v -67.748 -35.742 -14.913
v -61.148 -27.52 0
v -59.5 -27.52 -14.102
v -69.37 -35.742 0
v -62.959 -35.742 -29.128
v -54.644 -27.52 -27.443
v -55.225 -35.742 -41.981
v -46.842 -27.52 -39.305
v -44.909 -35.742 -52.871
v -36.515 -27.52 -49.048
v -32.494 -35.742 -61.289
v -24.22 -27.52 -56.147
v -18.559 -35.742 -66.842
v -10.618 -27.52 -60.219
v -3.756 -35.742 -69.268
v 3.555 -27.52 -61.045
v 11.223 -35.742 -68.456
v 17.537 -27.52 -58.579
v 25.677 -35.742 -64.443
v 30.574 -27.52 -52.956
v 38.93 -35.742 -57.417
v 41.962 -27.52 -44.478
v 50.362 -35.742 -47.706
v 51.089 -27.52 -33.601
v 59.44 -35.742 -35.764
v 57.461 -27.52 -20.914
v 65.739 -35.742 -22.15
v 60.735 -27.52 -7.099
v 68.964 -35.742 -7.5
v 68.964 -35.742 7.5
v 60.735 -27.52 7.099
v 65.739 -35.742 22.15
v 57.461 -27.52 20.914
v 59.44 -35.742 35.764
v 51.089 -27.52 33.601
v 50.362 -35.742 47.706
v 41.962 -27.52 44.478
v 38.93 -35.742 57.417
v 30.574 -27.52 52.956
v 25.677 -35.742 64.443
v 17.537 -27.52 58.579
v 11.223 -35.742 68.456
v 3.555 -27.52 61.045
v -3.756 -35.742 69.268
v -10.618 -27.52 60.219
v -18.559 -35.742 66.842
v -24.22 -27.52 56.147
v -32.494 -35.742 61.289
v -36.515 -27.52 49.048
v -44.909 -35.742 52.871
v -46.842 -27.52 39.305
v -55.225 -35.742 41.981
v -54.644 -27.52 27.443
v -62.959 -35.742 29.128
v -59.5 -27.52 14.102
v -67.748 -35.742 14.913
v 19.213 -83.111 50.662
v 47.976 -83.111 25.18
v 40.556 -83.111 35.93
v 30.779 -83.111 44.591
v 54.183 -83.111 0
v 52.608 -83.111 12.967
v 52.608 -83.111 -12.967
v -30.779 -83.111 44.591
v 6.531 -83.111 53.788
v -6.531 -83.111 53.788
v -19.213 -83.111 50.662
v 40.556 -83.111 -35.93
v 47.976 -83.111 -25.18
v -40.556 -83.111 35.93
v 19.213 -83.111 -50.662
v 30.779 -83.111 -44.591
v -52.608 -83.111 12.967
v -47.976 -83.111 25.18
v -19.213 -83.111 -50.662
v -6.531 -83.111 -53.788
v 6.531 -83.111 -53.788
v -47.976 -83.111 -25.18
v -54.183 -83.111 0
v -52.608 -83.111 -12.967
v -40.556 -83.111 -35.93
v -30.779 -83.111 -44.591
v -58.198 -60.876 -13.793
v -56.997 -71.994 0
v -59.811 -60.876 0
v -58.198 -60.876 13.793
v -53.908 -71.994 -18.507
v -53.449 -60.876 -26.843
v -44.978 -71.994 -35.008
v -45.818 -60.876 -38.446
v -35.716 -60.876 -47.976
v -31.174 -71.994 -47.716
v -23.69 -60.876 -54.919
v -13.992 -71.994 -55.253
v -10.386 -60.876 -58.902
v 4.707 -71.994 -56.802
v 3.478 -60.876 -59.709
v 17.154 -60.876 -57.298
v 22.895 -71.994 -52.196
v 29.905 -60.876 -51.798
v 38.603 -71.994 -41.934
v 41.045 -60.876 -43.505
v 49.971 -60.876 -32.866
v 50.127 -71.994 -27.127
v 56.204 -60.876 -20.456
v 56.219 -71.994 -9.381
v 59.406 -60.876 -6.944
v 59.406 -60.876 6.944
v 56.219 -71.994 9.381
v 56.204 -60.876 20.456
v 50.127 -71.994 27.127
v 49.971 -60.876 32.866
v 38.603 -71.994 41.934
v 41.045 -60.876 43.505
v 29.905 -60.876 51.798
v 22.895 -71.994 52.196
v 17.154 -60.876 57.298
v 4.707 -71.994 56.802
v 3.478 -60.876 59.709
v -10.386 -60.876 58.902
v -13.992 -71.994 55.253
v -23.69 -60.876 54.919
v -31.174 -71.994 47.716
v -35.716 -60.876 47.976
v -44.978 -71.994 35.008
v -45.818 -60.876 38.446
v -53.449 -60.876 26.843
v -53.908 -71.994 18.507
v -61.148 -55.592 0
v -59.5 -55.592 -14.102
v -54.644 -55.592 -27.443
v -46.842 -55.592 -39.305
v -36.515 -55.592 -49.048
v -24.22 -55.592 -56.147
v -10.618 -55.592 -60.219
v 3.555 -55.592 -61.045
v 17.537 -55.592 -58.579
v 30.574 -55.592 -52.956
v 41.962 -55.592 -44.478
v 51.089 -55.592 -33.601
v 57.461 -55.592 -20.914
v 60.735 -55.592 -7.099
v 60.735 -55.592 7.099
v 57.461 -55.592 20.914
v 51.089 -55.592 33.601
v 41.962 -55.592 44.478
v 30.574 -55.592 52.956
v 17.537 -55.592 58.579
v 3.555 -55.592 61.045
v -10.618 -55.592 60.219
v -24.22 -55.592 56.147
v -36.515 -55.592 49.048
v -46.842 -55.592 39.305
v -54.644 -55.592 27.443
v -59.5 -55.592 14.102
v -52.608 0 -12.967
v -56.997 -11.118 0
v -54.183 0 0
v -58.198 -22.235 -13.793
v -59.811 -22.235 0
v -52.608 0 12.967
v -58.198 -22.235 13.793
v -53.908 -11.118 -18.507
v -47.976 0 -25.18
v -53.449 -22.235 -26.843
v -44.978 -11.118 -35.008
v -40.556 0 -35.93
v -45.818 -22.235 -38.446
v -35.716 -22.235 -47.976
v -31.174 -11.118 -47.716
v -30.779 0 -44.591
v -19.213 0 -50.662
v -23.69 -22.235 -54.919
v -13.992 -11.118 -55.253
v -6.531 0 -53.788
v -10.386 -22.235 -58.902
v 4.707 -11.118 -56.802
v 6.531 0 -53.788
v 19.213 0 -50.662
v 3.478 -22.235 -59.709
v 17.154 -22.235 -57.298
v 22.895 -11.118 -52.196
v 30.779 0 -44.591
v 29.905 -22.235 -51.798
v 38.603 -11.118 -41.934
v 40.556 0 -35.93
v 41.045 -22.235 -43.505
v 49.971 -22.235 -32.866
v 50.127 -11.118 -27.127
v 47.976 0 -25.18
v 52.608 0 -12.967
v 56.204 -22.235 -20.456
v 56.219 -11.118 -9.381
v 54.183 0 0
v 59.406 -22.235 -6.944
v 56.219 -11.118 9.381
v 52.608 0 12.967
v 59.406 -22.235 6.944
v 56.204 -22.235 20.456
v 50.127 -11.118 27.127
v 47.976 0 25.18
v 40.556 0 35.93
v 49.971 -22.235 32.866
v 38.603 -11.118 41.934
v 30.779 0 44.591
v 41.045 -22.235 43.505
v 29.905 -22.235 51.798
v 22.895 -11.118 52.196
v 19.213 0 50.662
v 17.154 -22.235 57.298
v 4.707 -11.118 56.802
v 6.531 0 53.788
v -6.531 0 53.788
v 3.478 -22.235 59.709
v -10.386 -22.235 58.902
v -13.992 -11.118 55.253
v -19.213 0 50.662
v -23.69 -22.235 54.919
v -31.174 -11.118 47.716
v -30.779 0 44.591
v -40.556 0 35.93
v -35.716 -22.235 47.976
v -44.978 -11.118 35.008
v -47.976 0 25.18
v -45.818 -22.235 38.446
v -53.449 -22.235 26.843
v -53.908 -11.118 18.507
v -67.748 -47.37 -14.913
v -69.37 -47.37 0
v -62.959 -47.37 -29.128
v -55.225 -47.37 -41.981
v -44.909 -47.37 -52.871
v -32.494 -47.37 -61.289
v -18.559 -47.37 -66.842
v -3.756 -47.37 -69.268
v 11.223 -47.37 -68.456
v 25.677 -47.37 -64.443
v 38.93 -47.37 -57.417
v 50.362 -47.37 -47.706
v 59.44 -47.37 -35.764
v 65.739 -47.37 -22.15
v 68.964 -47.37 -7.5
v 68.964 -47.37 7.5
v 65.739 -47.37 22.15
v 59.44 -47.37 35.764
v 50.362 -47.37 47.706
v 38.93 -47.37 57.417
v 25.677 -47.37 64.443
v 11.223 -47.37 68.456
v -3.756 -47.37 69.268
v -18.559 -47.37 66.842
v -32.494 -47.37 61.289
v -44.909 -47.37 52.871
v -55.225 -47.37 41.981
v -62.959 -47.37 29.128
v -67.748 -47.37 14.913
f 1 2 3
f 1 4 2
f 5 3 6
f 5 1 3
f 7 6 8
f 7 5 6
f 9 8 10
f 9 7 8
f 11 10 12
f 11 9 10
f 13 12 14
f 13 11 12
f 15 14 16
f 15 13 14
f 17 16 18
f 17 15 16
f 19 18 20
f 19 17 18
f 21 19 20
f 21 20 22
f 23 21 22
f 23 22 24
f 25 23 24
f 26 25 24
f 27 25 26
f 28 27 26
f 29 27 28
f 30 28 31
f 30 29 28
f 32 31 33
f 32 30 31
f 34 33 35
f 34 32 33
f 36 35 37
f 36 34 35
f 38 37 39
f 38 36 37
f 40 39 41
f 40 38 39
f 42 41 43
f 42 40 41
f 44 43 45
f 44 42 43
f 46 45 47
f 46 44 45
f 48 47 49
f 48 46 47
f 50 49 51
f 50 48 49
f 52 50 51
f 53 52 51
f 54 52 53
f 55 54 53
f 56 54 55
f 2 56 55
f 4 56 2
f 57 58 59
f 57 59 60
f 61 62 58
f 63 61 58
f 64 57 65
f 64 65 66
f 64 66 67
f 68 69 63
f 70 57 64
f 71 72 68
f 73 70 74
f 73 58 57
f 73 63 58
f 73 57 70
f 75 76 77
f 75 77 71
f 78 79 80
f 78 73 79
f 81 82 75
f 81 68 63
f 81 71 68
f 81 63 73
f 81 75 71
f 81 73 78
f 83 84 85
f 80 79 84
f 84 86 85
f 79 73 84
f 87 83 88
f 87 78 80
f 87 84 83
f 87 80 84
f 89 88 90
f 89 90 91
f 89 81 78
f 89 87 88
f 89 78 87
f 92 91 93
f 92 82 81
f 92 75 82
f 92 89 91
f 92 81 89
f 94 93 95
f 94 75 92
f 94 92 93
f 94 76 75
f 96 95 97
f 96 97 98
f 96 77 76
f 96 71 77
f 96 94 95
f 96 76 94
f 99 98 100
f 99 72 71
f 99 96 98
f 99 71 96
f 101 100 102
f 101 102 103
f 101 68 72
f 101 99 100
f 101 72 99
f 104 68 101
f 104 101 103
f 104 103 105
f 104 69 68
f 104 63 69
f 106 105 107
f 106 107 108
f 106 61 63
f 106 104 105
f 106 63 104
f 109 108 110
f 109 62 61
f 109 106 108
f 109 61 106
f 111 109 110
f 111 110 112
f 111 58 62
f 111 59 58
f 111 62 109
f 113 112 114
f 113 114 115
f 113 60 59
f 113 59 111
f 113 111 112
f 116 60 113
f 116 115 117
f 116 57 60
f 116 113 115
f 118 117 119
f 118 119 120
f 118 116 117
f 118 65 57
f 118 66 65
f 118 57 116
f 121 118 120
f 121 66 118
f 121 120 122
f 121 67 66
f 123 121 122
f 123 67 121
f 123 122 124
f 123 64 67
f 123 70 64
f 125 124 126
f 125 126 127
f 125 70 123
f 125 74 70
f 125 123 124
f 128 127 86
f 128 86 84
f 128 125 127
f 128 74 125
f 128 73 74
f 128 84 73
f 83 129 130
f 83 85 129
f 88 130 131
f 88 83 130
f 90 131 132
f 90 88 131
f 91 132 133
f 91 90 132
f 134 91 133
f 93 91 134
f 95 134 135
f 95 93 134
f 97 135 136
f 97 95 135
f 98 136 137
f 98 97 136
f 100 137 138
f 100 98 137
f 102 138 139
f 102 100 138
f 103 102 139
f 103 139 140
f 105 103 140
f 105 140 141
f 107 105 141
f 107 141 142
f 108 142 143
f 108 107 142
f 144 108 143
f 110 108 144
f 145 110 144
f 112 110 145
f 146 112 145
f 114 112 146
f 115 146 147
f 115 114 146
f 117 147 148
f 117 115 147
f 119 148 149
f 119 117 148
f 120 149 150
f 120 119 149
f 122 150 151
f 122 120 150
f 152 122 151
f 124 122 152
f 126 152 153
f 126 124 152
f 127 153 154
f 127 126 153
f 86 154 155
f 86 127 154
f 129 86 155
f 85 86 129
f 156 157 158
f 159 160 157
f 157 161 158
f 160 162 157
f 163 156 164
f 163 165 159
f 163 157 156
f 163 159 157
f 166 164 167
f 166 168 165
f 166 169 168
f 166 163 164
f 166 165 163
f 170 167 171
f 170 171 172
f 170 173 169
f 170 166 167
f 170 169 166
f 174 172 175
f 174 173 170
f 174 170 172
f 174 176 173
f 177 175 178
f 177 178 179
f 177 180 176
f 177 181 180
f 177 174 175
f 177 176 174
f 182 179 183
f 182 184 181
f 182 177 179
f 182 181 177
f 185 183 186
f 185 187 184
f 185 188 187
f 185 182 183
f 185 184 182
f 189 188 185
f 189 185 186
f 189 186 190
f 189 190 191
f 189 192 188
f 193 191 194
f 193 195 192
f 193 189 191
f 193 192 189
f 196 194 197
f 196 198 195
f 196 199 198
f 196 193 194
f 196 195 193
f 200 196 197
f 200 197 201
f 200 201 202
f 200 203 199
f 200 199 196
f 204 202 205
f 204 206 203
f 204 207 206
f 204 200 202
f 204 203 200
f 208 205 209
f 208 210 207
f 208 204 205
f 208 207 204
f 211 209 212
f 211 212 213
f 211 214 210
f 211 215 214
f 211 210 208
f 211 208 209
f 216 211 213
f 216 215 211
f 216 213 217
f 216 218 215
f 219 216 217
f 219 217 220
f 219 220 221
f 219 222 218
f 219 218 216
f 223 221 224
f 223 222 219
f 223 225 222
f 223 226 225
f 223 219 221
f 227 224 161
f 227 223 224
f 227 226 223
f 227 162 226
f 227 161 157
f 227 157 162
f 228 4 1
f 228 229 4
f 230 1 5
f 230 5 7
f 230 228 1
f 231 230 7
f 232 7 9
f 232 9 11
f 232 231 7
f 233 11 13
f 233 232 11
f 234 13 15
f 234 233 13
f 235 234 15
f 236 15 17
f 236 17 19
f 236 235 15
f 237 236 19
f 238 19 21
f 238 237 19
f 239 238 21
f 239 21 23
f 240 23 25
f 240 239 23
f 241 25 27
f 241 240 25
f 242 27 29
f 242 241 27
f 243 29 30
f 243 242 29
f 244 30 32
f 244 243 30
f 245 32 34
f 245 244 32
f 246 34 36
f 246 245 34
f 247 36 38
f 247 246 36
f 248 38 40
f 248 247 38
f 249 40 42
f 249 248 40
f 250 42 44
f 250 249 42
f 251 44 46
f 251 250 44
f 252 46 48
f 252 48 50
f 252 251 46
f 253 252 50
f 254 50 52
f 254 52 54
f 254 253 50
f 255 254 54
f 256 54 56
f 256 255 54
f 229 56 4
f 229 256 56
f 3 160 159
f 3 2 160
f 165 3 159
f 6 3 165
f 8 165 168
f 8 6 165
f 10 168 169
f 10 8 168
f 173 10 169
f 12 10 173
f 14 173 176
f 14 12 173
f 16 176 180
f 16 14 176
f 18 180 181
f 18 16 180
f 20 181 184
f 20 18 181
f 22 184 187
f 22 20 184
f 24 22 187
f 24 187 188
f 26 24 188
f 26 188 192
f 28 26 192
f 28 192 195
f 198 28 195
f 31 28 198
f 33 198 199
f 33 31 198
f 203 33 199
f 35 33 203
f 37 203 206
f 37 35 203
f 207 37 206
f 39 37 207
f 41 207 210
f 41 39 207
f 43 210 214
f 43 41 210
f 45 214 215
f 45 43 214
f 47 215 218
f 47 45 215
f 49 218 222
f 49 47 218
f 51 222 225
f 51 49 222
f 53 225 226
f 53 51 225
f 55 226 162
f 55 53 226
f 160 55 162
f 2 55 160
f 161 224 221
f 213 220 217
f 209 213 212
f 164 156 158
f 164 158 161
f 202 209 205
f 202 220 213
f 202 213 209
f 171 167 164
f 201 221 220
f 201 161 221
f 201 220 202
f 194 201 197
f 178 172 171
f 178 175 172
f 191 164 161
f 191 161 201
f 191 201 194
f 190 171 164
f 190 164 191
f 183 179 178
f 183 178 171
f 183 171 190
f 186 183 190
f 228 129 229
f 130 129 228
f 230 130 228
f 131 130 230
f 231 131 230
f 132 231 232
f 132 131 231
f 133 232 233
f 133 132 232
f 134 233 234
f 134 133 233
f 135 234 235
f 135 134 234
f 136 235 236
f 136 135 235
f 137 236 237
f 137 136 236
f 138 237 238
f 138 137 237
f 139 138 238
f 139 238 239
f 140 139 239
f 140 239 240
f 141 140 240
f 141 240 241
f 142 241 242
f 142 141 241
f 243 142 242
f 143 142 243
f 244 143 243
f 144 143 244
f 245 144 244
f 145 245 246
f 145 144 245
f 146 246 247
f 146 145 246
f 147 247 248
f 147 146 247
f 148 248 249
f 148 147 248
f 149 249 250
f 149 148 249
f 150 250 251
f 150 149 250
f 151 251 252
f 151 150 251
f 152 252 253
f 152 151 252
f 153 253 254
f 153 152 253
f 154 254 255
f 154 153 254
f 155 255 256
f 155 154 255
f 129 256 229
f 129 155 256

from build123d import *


with BuildPart() as f1:
    # F0 (on Top) → F1 (revolve)
    with BuildSketch(Plane.XY):
        Polygon((0, -22.373166), (0, 0), (-54.182574, 0), (-59.810659, -22.235475), (-61.148187, -27.519786), (0, -27.519786), align=None)
        Polygon((0, -41.5557), (0, -27.519786), (-61.148187, -27.519786), (-69.370231, -35.74183), (-69.370231, -41.5557), align=None)
        Polygon((0, -47.975048), (0, -41.5557), (-69.370231, -41.5557), (-69.370231, -47.369569), (-61.148187, -55.591614), (0, -55.591614), align=None)
        Polygon((0, -83.111399), (0, -55.591614), (-61.148187, -55.591614), (-59.810659, -60.875925), (-54.182574, -83.111399), align=None)
    revolve(axis=Axis((0, -11.186583, 0), (0, -1, 0)))


solid = f1.part
